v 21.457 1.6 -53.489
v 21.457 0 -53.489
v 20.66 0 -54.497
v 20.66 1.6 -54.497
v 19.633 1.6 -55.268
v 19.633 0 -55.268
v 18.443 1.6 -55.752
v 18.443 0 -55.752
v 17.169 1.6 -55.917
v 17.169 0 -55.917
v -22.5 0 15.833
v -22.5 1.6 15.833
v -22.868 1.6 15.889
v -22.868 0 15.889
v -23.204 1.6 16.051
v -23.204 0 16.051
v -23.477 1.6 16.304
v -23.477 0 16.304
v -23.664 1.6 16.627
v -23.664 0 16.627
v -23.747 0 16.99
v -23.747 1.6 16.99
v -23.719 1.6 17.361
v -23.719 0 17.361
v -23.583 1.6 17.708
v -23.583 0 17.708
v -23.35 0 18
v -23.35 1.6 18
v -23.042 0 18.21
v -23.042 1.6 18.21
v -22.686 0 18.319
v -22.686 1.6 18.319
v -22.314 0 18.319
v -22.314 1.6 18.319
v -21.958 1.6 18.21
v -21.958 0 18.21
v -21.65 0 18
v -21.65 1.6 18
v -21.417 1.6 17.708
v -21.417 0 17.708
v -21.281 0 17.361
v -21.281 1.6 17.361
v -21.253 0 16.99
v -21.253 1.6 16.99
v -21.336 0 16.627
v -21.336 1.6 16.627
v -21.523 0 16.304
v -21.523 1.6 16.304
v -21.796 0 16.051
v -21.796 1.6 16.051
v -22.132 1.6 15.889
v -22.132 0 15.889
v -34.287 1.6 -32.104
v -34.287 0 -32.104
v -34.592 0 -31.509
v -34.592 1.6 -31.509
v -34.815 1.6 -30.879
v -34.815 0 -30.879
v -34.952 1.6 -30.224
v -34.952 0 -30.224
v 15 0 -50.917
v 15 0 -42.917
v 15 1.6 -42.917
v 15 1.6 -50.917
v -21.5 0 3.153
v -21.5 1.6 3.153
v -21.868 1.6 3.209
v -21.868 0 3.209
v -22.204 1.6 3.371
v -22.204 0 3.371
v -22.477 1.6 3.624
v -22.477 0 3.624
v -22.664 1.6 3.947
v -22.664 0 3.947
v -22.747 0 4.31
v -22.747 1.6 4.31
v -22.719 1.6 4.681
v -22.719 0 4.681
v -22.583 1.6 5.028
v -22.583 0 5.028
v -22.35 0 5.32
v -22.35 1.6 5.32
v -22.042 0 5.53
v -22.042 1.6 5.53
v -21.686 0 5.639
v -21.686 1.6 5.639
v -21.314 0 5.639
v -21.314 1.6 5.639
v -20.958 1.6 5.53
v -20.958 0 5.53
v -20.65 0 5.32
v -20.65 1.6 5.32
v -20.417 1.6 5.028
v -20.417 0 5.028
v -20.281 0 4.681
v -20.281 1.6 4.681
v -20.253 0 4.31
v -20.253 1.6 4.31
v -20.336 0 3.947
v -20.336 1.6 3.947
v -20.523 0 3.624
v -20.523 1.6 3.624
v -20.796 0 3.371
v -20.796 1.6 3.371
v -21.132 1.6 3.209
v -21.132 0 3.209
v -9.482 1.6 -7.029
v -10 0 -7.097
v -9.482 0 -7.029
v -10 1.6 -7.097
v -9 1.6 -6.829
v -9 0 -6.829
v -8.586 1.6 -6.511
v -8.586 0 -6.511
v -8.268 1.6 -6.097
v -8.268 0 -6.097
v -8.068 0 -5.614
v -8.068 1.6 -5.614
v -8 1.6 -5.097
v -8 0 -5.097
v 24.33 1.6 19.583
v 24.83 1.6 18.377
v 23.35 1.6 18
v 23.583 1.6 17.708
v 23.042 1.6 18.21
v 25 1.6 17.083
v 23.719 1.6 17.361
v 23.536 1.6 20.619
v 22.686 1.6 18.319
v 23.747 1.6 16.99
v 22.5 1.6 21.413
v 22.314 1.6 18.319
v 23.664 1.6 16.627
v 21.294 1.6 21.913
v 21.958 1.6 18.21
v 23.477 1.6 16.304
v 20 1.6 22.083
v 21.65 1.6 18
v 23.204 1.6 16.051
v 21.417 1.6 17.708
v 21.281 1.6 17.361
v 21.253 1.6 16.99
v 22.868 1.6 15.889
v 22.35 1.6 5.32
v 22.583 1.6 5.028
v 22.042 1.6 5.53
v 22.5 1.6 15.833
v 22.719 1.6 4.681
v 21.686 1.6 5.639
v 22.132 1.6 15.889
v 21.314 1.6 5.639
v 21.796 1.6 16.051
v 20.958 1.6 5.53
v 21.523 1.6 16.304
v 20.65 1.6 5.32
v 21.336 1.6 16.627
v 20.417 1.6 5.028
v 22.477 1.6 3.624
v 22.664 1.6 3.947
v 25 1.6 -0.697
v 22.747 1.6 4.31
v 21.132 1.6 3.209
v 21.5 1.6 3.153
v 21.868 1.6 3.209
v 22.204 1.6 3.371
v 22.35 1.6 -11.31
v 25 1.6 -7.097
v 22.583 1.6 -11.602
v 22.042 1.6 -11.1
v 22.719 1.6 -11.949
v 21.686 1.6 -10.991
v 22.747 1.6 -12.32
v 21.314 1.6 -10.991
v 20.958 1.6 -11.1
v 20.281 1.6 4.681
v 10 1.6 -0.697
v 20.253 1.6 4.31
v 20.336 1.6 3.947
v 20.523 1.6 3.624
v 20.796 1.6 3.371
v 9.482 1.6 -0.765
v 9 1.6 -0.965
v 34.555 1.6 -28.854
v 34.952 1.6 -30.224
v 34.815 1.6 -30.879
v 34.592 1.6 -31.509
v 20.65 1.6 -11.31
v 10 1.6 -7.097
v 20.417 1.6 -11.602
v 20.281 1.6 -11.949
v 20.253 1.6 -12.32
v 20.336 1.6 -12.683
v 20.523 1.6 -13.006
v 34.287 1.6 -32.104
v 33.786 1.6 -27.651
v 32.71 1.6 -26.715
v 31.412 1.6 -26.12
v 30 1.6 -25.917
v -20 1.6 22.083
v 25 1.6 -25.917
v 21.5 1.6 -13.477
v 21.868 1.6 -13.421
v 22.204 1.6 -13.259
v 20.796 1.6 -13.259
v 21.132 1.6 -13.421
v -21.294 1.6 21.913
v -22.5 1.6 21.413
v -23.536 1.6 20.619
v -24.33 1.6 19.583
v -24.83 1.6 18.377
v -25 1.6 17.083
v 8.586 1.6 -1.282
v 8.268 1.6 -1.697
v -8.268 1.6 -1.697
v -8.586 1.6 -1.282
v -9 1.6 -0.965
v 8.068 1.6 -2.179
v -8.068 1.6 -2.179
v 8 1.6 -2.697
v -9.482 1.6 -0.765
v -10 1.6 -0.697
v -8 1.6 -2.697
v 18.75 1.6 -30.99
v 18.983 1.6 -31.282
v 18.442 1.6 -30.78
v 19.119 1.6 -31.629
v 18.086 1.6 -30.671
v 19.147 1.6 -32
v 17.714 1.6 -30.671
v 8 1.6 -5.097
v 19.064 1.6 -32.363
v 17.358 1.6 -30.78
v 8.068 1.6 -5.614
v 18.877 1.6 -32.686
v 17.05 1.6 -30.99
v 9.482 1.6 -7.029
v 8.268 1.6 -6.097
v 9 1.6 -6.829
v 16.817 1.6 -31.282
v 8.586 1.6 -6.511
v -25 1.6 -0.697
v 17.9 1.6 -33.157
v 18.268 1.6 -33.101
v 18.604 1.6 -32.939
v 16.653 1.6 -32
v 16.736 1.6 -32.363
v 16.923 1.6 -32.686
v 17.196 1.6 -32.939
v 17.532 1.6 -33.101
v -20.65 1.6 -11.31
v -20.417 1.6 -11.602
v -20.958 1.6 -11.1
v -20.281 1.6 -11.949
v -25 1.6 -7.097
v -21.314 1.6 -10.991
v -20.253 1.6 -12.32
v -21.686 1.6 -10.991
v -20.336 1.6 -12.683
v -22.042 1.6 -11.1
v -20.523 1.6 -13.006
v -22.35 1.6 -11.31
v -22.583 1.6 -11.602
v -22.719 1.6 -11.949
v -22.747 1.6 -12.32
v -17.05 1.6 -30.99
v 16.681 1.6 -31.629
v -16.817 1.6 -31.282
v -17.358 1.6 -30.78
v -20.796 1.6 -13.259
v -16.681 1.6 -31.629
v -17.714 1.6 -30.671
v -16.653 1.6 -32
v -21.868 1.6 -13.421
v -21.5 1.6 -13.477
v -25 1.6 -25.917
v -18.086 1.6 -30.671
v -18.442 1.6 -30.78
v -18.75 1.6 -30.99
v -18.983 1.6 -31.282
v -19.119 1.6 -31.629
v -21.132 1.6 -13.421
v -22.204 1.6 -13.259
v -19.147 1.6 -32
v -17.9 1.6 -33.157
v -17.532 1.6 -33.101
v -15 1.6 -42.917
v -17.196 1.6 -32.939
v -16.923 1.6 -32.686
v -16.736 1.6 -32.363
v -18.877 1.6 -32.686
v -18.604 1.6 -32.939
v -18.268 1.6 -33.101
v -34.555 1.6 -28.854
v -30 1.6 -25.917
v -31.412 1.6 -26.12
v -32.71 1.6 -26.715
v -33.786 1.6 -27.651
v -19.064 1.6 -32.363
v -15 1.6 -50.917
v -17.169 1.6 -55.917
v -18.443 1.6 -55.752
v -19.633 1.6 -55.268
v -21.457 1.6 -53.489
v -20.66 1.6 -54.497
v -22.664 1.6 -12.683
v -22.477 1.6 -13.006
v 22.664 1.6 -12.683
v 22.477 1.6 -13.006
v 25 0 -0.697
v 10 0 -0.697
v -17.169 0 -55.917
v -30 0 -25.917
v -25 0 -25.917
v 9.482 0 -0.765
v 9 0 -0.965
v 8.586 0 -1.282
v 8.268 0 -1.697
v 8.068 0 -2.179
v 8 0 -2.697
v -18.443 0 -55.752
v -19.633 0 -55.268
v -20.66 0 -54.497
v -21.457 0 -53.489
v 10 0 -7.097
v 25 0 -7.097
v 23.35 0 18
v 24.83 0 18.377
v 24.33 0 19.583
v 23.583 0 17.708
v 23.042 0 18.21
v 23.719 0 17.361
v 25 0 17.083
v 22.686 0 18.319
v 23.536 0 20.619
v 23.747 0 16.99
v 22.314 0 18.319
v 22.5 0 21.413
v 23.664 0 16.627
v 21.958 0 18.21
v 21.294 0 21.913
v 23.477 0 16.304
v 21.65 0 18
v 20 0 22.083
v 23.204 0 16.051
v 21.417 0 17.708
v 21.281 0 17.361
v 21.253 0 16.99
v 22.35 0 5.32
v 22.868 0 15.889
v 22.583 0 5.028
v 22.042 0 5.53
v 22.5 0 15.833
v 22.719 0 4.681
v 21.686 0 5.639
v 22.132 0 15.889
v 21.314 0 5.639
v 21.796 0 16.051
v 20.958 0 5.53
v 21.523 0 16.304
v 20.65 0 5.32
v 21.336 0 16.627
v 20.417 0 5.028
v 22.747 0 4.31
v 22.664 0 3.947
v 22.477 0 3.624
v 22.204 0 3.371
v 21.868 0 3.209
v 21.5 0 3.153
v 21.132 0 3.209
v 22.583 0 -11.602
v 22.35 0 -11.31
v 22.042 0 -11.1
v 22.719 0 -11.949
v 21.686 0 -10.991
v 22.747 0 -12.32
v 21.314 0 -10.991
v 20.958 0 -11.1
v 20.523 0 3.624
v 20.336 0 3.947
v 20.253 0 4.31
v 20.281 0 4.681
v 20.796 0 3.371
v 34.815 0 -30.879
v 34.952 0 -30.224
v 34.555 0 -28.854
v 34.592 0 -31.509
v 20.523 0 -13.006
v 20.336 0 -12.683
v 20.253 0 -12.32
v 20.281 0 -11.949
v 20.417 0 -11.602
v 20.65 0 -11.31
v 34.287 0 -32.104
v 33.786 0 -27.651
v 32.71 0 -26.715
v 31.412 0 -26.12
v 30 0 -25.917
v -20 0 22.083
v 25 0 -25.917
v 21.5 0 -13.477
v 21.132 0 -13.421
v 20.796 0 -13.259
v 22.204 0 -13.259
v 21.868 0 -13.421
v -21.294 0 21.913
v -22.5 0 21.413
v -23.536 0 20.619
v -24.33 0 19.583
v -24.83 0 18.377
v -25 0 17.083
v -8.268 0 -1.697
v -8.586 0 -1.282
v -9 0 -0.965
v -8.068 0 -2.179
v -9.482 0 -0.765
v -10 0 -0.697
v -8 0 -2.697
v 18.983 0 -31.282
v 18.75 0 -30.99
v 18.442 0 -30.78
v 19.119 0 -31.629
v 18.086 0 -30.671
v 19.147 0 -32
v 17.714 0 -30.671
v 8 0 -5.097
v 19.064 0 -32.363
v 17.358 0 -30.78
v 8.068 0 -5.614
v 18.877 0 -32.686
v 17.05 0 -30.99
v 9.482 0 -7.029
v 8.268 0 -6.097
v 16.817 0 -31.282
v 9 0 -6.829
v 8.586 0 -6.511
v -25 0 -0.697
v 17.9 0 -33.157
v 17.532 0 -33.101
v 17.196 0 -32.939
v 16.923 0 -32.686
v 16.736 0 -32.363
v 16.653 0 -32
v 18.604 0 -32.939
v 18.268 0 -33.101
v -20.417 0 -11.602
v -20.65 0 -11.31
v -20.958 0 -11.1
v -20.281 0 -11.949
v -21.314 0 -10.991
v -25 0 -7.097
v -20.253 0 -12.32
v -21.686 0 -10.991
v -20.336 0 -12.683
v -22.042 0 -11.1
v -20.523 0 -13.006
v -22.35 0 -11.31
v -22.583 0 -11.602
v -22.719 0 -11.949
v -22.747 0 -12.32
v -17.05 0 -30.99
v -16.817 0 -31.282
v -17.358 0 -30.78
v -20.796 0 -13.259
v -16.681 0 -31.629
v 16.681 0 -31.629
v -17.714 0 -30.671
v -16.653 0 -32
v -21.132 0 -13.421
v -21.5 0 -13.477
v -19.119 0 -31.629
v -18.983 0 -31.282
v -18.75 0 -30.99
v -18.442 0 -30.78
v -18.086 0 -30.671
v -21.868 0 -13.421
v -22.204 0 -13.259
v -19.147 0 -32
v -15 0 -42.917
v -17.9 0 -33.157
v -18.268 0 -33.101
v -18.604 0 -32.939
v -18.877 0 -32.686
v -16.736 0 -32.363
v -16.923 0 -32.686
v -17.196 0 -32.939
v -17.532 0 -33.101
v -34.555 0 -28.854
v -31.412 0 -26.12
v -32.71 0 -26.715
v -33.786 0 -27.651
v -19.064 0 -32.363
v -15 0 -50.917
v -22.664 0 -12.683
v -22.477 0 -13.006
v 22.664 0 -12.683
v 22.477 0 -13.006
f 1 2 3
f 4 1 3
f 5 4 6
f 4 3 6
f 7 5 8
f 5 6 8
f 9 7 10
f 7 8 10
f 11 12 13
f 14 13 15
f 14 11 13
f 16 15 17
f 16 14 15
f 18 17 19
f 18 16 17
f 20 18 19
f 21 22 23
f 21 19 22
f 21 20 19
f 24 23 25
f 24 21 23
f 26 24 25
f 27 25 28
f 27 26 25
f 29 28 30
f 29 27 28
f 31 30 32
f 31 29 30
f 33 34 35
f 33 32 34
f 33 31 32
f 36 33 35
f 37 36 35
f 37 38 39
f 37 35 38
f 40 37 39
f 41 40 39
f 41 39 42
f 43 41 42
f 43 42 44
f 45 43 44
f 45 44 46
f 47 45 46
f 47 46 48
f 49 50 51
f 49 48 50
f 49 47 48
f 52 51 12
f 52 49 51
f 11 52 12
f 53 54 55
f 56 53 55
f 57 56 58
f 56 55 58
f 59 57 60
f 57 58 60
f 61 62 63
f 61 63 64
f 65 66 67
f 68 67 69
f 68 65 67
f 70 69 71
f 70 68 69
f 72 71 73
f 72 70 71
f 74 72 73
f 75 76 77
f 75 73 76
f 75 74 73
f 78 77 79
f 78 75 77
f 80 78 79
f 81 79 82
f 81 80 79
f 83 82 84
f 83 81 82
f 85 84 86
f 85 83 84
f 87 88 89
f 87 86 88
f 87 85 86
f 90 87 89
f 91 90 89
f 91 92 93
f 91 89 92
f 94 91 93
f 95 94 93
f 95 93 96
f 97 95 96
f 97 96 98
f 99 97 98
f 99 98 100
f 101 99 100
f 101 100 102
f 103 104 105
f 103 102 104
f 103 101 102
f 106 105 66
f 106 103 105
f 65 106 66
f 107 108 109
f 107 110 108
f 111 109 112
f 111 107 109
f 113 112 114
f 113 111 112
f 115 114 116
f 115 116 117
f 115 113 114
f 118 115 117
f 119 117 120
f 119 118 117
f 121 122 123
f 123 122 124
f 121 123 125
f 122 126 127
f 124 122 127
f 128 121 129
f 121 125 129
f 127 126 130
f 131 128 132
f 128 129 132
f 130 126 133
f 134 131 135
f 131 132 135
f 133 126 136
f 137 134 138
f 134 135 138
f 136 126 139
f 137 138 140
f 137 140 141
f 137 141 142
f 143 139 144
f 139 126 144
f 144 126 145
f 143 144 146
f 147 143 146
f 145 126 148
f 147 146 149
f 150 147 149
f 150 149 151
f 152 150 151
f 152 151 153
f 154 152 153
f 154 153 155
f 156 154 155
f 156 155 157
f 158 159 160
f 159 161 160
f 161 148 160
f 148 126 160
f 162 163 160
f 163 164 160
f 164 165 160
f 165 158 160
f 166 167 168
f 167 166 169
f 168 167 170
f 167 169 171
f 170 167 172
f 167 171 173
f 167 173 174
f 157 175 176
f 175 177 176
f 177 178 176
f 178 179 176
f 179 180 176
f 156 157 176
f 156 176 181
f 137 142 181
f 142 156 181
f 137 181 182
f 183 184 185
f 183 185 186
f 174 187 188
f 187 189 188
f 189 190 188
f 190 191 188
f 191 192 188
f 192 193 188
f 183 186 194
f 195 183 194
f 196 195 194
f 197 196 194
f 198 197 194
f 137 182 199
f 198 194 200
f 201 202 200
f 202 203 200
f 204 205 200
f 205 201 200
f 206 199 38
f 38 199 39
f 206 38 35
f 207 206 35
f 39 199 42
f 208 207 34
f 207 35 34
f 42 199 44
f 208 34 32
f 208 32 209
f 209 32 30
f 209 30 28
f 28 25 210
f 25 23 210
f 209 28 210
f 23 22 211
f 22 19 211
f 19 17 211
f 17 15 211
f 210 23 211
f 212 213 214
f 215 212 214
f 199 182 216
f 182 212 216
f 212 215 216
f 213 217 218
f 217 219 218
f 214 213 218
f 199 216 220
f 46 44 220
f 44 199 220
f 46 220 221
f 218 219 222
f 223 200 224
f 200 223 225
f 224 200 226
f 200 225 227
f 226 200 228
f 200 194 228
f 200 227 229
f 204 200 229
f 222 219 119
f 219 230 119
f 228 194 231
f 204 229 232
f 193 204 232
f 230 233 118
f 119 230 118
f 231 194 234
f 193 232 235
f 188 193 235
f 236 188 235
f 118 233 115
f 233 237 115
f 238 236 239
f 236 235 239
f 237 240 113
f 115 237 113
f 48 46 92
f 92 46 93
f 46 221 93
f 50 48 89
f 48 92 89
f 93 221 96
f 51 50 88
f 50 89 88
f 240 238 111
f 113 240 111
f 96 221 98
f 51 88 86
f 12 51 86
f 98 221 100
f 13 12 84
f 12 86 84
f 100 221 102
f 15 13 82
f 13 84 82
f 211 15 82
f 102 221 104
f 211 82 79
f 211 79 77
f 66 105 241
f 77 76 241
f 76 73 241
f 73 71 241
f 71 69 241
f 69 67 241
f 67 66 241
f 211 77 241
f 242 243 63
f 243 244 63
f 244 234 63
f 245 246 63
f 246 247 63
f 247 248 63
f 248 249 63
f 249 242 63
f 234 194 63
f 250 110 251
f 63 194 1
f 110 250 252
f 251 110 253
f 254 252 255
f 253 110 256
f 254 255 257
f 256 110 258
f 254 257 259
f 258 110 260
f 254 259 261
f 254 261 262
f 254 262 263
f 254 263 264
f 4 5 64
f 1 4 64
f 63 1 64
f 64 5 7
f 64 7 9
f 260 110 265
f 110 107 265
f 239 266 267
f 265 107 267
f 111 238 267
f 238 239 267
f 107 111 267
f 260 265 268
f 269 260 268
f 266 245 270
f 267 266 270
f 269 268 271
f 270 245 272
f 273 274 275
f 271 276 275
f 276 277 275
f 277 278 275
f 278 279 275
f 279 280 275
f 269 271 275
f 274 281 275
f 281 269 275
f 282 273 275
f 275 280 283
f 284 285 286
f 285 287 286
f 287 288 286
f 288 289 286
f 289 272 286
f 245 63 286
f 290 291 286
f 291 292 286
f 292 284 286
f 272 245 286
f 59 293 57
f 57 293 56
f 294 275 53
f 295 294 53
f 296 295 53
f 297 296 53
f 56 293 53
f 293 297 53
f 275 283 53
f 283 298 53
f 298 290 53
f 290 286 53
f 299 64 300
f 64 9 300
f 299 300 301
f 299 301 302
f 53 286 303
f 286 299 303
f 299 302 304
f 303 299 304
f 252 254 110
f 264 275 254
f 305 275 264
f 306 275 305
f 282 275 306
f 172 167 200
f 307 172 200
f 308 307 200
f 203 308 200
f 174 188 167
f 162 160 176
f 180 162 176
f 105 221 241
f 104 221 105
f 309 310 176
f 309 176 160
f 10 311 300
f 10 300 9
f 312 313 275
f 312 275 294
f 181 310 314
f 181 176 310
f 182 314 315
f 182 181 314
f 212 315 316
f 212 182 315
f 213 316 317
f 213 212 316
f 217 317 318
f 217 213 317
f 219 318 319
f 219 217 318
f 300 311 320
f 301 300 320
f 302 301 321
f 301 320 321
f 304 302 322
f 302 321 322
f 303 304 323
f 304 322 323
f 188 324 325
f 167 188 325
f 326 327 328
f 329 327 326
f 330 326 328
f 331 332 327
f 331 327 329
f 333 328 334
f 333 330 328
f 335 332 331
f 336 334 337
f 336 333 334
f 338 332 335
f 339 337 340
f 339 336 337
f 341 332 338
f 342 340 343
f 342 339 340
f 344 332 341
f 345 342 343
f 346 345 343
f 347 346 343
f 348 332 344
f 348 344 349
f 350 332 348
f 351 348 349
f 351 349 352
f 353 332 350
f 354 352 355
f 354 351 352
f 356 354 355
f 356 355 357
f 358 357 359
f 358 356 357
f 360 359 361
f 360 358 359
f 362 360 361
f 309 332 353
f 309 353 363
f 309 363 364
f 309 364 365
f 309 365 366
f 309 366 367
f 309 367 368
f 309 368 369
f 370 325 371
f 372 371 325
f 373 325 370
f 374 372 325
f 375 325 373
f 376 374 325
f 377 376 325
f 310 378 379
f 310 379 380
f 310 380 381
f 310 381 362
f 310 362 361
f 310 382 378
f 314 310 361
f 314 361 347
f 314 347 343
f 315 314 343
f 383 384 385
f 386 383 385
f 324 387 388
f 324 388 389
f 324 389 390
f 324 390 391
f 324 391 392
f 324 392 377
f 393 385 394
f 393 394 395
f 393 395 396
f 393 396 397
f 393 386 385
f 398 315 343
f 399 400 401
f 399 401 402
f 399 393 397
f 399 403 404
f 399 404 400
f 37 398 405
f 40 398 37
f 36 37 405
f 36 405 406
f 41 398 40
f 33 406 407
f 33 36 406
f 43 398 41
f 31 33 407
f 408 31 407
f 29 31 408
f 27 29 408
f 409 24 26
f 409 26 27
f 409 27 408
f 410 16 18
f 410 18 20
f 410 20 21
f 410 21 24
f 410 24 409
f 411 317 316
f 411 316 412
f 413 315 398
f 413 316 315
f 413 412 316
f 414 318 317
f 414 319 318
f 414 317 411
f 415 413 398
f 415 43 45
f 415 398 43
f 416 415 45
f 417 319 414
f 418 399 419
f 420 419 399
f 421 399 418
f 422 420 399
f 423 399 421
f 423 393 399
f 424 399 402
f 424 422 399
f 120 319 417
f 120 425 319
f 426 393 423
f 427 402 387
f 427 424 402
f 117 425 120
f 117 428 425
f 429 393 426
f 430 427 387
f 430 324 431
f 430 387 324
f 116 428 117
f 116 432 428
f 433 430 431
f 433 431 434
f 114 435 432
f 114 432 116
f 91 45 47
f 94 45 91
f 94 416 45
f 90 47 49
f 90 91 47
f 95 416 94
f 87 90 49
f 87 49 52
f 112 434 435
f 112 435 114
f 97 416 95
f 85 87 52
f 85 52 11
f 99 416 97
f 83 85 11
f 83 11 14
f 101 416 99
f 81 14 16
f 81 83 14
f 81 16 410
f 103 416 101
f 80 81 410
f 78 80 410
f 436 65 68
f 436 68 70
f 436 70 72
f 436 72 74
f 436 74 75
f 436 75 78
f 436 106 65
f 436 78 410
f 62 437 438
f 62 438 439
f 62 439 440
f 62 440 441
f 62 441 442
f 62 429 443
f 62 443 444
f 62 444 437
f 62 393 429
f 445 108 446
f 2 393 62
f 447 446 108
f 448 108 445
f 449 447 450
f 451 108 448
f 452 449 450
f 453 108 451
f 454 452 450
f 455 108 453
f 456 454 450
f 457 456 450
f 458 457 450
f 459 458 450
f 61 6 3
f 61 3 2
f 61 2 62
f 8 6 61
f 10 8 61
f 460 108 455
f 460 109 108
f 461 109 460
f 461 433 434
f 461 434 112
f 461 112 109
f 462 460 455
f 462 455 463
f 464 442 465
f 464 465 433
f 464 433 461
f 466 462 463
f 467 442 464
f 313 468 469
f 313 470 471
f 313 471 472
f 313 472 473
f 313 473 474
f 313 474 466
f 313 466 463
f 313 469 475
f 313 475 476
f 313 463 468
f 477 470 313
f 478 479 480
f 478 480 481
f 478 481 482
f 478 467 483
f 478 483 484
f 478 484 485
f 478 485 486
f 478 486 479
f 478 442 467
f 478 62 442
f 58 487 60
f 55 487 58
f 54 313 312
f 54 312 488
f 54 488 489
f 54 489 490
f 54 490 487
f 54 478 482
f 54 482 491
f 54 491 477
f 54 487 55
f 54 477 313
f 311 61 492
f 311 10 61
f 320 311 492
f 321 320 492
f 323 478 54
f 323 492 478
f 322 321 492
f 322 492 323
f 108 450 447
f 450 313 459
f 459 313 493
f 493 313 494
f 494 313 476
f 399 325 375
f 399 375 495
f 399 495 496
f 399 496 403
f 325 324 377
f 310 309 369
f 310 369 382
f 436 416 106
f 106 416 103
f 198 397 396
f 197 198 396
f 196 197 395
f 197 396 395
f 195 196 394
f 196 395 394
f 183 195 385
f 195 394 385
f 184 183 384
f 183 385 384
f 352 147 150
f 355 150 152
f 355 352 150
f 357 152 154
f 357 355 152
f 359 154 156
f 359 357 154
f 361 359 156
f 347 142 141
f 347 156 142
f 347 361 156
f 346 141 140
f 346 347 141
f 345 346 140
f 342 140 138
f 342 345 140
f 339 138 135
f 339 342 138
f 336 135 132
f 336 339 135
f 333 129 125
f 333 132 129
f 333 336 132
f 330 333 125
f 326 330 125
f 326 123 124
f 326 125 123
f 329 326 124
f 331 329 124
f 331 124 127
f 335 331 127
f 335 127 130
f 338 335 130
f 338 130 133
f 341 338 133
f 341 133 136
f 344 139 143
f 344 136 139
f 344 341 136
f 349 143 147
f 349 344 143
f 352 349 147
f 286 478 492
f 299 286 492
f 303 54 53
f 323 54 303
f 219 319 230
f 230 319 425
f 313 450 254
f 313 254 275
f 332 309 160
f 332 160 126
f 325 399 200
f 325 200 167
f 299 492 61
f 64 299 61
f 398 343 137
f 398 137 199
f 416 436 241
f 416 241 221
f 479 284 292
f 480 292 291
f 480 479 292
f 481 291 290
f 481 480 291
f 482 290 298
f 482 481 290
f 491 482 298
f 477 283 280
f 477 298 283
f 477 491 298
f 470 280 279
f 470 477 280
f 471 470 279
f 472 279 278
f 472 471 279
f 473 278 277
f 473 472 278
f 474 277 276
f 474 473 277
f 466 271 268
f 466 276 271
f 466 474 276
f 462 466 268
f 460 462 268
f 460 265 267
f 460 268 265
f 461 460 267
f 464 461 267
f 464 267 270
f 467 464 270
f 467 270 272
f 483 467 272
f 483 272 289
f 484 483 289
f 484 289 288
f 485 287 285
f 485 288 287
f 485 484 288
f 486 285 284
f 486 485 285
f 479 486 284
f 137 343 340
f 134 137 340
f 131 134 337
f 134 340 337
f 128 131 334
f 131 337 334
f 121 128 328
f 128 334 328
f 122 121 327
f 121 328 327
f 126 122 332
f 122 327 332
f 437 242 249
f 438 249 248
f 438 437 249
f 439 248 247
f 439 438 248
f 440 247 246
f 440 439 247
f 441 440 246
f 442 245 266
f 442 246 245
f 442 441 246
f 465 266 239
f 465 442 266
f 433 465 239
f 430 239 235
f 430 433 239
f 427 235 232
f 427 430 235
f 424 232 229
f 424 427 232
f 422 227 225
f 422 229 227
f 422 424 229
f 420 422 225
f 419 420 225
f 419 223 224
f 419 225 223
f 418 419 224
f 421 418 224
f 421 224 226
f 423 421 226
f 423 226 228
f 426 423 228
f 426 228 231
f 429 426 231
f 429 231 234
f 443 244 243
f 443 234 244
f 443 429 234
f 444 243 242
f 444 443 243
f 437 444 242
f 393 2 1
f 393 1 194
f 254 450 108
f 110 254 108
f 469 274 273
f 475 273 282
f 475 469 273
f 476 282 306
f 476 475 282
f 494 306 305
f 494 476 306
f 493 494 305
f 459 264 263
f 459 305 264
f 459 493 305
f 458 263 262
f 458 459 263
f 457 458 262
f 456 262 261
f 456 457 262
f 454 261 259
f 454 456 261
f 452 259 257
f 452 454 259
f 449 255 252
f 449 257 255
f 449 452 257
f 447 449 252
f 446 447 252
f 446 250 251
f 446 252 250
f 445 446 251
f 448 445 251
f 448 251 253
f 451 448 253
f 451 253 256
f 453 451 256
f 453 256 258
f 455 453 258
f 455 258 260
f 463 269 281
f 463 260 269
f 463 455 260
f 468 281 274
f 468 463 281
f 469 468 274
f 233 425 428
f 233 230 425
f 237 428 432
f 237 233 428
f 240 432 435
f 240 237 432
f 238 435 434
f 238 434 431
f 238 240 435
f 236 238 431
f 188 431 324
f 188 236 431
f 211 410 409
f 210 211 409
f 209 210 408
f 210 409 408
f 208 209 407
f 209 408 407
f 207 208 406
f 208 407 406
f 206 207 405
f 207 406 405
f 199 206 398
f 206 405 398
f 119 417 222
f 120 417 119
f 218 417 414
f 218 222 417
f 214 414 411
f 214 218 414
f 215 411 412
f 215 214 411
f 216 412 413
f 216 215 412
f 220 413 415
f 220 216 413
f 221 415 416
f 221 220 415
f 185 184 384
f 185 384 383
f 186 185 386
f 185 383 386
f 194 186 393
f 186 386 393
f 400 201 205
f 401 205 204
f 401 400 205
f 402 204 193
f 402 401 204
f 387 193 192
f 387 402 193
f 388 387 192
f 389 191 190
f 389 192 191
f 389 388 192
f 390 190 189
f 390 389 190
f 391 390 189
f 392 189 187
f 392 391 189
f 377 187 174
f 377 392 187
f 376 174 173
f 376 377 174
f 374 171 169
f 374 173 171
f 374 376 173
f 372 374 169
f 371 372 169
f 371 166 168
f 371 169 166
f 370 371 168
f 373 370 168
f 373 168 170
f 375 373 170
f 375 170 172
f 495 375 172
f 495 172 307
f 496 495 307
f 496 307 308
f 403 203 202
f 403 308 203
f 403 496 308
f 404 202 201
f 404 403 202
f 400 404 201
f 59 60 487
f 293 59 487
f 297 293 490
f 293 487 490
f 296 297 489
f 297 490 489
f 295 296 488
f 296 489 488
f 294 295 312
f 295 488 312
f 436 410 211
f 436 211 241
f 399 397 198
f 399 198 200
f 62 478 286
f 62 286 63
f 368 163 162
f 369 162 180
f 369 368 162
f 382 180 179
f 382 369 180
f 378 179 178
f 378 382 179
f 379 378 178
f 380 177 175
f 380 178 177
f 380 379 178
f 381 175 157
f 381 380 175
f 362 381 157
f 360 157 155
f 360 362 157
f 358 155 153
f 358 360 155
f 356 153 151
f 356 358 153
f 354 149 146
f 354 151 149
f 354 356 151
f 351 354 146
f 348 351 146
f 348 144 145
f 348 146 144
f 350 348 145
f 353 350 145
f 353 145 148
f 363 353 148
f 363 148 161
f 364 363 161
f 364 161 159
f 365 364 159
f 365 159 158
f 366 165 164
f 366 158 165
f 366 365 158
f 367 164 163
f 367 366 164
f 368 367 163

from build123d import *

# Parameters (mm, degrees)
BOSS_EXTRUDE1_DEPTH = 1.6
FILLET1_R           = 5
SKETCH2_R           = 1.25
SKETCH2_W           = 17
SKETCH2_H           = 6.4
SKETCH2_W_2         = 30
SKETCH2_H_2         = 8
CUT_EXTRUDE1_DEPTH  = 3
FILLET2_R           = 2


with BuildPart() as part:
    # Sketch1 → Boss-Extrude1 (new body)
    with BuildSketch(Plane(origin=(0, 0, 0), x_dir=(1, 0, 0), z_dir=(0, 1, 0))):
        Polygon((-20, 55.916666667), (20, 55.916666667), (35, 30.916666667), (35, 25.916666667), (25, 25.916666667), (25, -22.083333333), (-25, -22.083333333), (-25, 25.916666667), (-35, 25.916666667), (-35, 30.916666667), align=None)
    extrude(amount=BOSS_EXTRUDE1_DEPTH)

    # Fillet1
    # the kernel refuses this fillet: 5 mm, written as the material it takes off along each edge
    with BuildSketch(Plane(origin=(-20, -7.077379737, -55.916666667), x_dir=(1, 0, 0), z_dir=(0, 1, 0))) as fillet1_piece_1:
        with BuildLine():
            CenterArc((FILLET1_R * 0.566190378969, -FILLET1_R), FILLET1_R, 90, 59.036243468)
            Line((-FILLET1_R * 0.291302546743, -FILLET1_R * 0.485504244572), (0, 0))
            Line((0, 0), (FILLET1_R * 0.566190378969, 0))
        make_face()
    extrude(amount=15.754759474, mode=Mode.SUBTRACT)
    with BuildSketch(Plane(origin=(20, -7.077379737, -55.916666667), x_dir=(-1, 0, 0), z_dir=(0, 1, 0))) as fillet1_piece_2:
        with BuildLine():
            CenterArc((FILLET1_R * 0.566190378969, FILLET1_R), FILLET1_R, 210.963756532, 59.036243468)
            Line((-FILLET1_R * 0.291302546743, FILLET1_R * 0.485504244572), (0, 0))
            Line((0, 0), (FILLET1_R * 0.566190378969, 0))
        make_face()
    extrude(amount=15.754759474, mode=Mode.SUBTRACT)
    with BuildSketch(Plane(origin=(-35, -3.462299562, -30.916666667), x_dir=(0, 0, 1), z_dir=(0, 1, 0)), Plane(origin=(35, -3.462299562, -30.916666667), x_dir=(-0.5144957554275258, 0, -0.8574929257125447), z_dir=(0, 1, 0))) as fillet1_piece_3:
        with BuildLine():
            CenterArc((FILLET1_R * 0.276983964948, FILLET1_R), FILLET1_R, 239.036243468, 30.963756532)
            Line((-FILLET1_R * 0.237511790479, FILLET1_R * 0.142507074287), (0, 0))
            Line((0, 0), (FILLET1_R * 0.276983964948, 0))
        make_face()
    extrude(amount=8.524599124, mode=Mode.SUBTRACT)
    with BuildSketch(Plane(origin=(-25, -12.5, 22.083333333), x_dir=(1, 0, 0), z_dir=(0, 1, 0)), Plane(origin=(25, -12.5, 22.083333333), x_dir=(0, 0, -1), z_dir=(0, 1, 0)), Plane(origin=(-35, -12.5, -25.916666667), x_dir=(1, 0, 0), z_dir=(0, 1, 0)), Plane(origin=(35, -12.5, -25.916666667), x_dir=(0, 0, -1), z_dir=(0, 1, 0))) as fillet1_piece_4:
        with BuildLine():
            CenterArc((FILLET1_R, FILLET1_R), FILLET1_R, 180, 90)
            Line((0, FILLET1_R), (0, 0))
            Line((0, 0), (FILLET1_R, 0))
        make_face()
    extrude(amount=26.6, mode=Mode.SUBTRACT)

    # Sketch2 → Cut-Extrude1 (cut)
    with BuildSketch(Plane(origin=(0, 0, 0), x_dir=(1, 0, 0), z_dir=(0, 1, 0))):
        with Locations(Location((22.5, -17.083333333, 0), (0, 0, 90))):
            Circle(SKETCH2_R)
        with Locations(Location((21.5, -4.403333333, 0), (0, 0, 90))):
            Circle(SKETCH2_R)
        with Locations(Location((17.9, 31.906666667, 0), (0, 0, 90))):
            Circle(SKETCH2_R)
        with Locations(Location((21.5, 12.226666667, 0), (0, 0, 90))):
            Circle(SKETCH2_R)
        with Locations(Location((-17.9, 31.906666667, 0), (0, 0, 90))):
            Circle(SKETCH2_R)
        with Locations(Location((-21.5, 12.226666667, 0), (0, 0, 90))):
            Circle(SKETCH2_R)
        with Locations(Location((-21.5, -4.403333333, 0), (0, 0, 90))):
            Circle(SKETCH2_R)
        with Locations(Location((-22.5, -17.083333333, 0), (0, 0, 90))):
            Circle(SKETCH2_R)
        with Locations((16.5, 3.896666667)):
            Rectangle(SKETCH2_W, SKETCH2_H)
        with Locations((-16.5, 3.896666667)):
            Rectangle(SKETCH2_W, SKETCH2_H)
        with Locations((0, 46.916666667)):
            Rectangle(SKETCH2_W_2, SKETCH2_H_2)
    extrude(amount=CUT_EXTRUDE1_DEPTH, mode=Mode.SUBTRACT)

    # Fillet2
    fillet2_edges = [part.edges().sort_by_distance(p)[0] for p in [
        (8, 0.8, -7.096666667),
        (8, 0.8, -0.696666667),
        (-8, 0.8, -0.696666667),
        (-8, 0.8, -7.096666667),
    ]]
    fillet(fillet2_edges, radius=FILLET2_R)


solid = part.part
